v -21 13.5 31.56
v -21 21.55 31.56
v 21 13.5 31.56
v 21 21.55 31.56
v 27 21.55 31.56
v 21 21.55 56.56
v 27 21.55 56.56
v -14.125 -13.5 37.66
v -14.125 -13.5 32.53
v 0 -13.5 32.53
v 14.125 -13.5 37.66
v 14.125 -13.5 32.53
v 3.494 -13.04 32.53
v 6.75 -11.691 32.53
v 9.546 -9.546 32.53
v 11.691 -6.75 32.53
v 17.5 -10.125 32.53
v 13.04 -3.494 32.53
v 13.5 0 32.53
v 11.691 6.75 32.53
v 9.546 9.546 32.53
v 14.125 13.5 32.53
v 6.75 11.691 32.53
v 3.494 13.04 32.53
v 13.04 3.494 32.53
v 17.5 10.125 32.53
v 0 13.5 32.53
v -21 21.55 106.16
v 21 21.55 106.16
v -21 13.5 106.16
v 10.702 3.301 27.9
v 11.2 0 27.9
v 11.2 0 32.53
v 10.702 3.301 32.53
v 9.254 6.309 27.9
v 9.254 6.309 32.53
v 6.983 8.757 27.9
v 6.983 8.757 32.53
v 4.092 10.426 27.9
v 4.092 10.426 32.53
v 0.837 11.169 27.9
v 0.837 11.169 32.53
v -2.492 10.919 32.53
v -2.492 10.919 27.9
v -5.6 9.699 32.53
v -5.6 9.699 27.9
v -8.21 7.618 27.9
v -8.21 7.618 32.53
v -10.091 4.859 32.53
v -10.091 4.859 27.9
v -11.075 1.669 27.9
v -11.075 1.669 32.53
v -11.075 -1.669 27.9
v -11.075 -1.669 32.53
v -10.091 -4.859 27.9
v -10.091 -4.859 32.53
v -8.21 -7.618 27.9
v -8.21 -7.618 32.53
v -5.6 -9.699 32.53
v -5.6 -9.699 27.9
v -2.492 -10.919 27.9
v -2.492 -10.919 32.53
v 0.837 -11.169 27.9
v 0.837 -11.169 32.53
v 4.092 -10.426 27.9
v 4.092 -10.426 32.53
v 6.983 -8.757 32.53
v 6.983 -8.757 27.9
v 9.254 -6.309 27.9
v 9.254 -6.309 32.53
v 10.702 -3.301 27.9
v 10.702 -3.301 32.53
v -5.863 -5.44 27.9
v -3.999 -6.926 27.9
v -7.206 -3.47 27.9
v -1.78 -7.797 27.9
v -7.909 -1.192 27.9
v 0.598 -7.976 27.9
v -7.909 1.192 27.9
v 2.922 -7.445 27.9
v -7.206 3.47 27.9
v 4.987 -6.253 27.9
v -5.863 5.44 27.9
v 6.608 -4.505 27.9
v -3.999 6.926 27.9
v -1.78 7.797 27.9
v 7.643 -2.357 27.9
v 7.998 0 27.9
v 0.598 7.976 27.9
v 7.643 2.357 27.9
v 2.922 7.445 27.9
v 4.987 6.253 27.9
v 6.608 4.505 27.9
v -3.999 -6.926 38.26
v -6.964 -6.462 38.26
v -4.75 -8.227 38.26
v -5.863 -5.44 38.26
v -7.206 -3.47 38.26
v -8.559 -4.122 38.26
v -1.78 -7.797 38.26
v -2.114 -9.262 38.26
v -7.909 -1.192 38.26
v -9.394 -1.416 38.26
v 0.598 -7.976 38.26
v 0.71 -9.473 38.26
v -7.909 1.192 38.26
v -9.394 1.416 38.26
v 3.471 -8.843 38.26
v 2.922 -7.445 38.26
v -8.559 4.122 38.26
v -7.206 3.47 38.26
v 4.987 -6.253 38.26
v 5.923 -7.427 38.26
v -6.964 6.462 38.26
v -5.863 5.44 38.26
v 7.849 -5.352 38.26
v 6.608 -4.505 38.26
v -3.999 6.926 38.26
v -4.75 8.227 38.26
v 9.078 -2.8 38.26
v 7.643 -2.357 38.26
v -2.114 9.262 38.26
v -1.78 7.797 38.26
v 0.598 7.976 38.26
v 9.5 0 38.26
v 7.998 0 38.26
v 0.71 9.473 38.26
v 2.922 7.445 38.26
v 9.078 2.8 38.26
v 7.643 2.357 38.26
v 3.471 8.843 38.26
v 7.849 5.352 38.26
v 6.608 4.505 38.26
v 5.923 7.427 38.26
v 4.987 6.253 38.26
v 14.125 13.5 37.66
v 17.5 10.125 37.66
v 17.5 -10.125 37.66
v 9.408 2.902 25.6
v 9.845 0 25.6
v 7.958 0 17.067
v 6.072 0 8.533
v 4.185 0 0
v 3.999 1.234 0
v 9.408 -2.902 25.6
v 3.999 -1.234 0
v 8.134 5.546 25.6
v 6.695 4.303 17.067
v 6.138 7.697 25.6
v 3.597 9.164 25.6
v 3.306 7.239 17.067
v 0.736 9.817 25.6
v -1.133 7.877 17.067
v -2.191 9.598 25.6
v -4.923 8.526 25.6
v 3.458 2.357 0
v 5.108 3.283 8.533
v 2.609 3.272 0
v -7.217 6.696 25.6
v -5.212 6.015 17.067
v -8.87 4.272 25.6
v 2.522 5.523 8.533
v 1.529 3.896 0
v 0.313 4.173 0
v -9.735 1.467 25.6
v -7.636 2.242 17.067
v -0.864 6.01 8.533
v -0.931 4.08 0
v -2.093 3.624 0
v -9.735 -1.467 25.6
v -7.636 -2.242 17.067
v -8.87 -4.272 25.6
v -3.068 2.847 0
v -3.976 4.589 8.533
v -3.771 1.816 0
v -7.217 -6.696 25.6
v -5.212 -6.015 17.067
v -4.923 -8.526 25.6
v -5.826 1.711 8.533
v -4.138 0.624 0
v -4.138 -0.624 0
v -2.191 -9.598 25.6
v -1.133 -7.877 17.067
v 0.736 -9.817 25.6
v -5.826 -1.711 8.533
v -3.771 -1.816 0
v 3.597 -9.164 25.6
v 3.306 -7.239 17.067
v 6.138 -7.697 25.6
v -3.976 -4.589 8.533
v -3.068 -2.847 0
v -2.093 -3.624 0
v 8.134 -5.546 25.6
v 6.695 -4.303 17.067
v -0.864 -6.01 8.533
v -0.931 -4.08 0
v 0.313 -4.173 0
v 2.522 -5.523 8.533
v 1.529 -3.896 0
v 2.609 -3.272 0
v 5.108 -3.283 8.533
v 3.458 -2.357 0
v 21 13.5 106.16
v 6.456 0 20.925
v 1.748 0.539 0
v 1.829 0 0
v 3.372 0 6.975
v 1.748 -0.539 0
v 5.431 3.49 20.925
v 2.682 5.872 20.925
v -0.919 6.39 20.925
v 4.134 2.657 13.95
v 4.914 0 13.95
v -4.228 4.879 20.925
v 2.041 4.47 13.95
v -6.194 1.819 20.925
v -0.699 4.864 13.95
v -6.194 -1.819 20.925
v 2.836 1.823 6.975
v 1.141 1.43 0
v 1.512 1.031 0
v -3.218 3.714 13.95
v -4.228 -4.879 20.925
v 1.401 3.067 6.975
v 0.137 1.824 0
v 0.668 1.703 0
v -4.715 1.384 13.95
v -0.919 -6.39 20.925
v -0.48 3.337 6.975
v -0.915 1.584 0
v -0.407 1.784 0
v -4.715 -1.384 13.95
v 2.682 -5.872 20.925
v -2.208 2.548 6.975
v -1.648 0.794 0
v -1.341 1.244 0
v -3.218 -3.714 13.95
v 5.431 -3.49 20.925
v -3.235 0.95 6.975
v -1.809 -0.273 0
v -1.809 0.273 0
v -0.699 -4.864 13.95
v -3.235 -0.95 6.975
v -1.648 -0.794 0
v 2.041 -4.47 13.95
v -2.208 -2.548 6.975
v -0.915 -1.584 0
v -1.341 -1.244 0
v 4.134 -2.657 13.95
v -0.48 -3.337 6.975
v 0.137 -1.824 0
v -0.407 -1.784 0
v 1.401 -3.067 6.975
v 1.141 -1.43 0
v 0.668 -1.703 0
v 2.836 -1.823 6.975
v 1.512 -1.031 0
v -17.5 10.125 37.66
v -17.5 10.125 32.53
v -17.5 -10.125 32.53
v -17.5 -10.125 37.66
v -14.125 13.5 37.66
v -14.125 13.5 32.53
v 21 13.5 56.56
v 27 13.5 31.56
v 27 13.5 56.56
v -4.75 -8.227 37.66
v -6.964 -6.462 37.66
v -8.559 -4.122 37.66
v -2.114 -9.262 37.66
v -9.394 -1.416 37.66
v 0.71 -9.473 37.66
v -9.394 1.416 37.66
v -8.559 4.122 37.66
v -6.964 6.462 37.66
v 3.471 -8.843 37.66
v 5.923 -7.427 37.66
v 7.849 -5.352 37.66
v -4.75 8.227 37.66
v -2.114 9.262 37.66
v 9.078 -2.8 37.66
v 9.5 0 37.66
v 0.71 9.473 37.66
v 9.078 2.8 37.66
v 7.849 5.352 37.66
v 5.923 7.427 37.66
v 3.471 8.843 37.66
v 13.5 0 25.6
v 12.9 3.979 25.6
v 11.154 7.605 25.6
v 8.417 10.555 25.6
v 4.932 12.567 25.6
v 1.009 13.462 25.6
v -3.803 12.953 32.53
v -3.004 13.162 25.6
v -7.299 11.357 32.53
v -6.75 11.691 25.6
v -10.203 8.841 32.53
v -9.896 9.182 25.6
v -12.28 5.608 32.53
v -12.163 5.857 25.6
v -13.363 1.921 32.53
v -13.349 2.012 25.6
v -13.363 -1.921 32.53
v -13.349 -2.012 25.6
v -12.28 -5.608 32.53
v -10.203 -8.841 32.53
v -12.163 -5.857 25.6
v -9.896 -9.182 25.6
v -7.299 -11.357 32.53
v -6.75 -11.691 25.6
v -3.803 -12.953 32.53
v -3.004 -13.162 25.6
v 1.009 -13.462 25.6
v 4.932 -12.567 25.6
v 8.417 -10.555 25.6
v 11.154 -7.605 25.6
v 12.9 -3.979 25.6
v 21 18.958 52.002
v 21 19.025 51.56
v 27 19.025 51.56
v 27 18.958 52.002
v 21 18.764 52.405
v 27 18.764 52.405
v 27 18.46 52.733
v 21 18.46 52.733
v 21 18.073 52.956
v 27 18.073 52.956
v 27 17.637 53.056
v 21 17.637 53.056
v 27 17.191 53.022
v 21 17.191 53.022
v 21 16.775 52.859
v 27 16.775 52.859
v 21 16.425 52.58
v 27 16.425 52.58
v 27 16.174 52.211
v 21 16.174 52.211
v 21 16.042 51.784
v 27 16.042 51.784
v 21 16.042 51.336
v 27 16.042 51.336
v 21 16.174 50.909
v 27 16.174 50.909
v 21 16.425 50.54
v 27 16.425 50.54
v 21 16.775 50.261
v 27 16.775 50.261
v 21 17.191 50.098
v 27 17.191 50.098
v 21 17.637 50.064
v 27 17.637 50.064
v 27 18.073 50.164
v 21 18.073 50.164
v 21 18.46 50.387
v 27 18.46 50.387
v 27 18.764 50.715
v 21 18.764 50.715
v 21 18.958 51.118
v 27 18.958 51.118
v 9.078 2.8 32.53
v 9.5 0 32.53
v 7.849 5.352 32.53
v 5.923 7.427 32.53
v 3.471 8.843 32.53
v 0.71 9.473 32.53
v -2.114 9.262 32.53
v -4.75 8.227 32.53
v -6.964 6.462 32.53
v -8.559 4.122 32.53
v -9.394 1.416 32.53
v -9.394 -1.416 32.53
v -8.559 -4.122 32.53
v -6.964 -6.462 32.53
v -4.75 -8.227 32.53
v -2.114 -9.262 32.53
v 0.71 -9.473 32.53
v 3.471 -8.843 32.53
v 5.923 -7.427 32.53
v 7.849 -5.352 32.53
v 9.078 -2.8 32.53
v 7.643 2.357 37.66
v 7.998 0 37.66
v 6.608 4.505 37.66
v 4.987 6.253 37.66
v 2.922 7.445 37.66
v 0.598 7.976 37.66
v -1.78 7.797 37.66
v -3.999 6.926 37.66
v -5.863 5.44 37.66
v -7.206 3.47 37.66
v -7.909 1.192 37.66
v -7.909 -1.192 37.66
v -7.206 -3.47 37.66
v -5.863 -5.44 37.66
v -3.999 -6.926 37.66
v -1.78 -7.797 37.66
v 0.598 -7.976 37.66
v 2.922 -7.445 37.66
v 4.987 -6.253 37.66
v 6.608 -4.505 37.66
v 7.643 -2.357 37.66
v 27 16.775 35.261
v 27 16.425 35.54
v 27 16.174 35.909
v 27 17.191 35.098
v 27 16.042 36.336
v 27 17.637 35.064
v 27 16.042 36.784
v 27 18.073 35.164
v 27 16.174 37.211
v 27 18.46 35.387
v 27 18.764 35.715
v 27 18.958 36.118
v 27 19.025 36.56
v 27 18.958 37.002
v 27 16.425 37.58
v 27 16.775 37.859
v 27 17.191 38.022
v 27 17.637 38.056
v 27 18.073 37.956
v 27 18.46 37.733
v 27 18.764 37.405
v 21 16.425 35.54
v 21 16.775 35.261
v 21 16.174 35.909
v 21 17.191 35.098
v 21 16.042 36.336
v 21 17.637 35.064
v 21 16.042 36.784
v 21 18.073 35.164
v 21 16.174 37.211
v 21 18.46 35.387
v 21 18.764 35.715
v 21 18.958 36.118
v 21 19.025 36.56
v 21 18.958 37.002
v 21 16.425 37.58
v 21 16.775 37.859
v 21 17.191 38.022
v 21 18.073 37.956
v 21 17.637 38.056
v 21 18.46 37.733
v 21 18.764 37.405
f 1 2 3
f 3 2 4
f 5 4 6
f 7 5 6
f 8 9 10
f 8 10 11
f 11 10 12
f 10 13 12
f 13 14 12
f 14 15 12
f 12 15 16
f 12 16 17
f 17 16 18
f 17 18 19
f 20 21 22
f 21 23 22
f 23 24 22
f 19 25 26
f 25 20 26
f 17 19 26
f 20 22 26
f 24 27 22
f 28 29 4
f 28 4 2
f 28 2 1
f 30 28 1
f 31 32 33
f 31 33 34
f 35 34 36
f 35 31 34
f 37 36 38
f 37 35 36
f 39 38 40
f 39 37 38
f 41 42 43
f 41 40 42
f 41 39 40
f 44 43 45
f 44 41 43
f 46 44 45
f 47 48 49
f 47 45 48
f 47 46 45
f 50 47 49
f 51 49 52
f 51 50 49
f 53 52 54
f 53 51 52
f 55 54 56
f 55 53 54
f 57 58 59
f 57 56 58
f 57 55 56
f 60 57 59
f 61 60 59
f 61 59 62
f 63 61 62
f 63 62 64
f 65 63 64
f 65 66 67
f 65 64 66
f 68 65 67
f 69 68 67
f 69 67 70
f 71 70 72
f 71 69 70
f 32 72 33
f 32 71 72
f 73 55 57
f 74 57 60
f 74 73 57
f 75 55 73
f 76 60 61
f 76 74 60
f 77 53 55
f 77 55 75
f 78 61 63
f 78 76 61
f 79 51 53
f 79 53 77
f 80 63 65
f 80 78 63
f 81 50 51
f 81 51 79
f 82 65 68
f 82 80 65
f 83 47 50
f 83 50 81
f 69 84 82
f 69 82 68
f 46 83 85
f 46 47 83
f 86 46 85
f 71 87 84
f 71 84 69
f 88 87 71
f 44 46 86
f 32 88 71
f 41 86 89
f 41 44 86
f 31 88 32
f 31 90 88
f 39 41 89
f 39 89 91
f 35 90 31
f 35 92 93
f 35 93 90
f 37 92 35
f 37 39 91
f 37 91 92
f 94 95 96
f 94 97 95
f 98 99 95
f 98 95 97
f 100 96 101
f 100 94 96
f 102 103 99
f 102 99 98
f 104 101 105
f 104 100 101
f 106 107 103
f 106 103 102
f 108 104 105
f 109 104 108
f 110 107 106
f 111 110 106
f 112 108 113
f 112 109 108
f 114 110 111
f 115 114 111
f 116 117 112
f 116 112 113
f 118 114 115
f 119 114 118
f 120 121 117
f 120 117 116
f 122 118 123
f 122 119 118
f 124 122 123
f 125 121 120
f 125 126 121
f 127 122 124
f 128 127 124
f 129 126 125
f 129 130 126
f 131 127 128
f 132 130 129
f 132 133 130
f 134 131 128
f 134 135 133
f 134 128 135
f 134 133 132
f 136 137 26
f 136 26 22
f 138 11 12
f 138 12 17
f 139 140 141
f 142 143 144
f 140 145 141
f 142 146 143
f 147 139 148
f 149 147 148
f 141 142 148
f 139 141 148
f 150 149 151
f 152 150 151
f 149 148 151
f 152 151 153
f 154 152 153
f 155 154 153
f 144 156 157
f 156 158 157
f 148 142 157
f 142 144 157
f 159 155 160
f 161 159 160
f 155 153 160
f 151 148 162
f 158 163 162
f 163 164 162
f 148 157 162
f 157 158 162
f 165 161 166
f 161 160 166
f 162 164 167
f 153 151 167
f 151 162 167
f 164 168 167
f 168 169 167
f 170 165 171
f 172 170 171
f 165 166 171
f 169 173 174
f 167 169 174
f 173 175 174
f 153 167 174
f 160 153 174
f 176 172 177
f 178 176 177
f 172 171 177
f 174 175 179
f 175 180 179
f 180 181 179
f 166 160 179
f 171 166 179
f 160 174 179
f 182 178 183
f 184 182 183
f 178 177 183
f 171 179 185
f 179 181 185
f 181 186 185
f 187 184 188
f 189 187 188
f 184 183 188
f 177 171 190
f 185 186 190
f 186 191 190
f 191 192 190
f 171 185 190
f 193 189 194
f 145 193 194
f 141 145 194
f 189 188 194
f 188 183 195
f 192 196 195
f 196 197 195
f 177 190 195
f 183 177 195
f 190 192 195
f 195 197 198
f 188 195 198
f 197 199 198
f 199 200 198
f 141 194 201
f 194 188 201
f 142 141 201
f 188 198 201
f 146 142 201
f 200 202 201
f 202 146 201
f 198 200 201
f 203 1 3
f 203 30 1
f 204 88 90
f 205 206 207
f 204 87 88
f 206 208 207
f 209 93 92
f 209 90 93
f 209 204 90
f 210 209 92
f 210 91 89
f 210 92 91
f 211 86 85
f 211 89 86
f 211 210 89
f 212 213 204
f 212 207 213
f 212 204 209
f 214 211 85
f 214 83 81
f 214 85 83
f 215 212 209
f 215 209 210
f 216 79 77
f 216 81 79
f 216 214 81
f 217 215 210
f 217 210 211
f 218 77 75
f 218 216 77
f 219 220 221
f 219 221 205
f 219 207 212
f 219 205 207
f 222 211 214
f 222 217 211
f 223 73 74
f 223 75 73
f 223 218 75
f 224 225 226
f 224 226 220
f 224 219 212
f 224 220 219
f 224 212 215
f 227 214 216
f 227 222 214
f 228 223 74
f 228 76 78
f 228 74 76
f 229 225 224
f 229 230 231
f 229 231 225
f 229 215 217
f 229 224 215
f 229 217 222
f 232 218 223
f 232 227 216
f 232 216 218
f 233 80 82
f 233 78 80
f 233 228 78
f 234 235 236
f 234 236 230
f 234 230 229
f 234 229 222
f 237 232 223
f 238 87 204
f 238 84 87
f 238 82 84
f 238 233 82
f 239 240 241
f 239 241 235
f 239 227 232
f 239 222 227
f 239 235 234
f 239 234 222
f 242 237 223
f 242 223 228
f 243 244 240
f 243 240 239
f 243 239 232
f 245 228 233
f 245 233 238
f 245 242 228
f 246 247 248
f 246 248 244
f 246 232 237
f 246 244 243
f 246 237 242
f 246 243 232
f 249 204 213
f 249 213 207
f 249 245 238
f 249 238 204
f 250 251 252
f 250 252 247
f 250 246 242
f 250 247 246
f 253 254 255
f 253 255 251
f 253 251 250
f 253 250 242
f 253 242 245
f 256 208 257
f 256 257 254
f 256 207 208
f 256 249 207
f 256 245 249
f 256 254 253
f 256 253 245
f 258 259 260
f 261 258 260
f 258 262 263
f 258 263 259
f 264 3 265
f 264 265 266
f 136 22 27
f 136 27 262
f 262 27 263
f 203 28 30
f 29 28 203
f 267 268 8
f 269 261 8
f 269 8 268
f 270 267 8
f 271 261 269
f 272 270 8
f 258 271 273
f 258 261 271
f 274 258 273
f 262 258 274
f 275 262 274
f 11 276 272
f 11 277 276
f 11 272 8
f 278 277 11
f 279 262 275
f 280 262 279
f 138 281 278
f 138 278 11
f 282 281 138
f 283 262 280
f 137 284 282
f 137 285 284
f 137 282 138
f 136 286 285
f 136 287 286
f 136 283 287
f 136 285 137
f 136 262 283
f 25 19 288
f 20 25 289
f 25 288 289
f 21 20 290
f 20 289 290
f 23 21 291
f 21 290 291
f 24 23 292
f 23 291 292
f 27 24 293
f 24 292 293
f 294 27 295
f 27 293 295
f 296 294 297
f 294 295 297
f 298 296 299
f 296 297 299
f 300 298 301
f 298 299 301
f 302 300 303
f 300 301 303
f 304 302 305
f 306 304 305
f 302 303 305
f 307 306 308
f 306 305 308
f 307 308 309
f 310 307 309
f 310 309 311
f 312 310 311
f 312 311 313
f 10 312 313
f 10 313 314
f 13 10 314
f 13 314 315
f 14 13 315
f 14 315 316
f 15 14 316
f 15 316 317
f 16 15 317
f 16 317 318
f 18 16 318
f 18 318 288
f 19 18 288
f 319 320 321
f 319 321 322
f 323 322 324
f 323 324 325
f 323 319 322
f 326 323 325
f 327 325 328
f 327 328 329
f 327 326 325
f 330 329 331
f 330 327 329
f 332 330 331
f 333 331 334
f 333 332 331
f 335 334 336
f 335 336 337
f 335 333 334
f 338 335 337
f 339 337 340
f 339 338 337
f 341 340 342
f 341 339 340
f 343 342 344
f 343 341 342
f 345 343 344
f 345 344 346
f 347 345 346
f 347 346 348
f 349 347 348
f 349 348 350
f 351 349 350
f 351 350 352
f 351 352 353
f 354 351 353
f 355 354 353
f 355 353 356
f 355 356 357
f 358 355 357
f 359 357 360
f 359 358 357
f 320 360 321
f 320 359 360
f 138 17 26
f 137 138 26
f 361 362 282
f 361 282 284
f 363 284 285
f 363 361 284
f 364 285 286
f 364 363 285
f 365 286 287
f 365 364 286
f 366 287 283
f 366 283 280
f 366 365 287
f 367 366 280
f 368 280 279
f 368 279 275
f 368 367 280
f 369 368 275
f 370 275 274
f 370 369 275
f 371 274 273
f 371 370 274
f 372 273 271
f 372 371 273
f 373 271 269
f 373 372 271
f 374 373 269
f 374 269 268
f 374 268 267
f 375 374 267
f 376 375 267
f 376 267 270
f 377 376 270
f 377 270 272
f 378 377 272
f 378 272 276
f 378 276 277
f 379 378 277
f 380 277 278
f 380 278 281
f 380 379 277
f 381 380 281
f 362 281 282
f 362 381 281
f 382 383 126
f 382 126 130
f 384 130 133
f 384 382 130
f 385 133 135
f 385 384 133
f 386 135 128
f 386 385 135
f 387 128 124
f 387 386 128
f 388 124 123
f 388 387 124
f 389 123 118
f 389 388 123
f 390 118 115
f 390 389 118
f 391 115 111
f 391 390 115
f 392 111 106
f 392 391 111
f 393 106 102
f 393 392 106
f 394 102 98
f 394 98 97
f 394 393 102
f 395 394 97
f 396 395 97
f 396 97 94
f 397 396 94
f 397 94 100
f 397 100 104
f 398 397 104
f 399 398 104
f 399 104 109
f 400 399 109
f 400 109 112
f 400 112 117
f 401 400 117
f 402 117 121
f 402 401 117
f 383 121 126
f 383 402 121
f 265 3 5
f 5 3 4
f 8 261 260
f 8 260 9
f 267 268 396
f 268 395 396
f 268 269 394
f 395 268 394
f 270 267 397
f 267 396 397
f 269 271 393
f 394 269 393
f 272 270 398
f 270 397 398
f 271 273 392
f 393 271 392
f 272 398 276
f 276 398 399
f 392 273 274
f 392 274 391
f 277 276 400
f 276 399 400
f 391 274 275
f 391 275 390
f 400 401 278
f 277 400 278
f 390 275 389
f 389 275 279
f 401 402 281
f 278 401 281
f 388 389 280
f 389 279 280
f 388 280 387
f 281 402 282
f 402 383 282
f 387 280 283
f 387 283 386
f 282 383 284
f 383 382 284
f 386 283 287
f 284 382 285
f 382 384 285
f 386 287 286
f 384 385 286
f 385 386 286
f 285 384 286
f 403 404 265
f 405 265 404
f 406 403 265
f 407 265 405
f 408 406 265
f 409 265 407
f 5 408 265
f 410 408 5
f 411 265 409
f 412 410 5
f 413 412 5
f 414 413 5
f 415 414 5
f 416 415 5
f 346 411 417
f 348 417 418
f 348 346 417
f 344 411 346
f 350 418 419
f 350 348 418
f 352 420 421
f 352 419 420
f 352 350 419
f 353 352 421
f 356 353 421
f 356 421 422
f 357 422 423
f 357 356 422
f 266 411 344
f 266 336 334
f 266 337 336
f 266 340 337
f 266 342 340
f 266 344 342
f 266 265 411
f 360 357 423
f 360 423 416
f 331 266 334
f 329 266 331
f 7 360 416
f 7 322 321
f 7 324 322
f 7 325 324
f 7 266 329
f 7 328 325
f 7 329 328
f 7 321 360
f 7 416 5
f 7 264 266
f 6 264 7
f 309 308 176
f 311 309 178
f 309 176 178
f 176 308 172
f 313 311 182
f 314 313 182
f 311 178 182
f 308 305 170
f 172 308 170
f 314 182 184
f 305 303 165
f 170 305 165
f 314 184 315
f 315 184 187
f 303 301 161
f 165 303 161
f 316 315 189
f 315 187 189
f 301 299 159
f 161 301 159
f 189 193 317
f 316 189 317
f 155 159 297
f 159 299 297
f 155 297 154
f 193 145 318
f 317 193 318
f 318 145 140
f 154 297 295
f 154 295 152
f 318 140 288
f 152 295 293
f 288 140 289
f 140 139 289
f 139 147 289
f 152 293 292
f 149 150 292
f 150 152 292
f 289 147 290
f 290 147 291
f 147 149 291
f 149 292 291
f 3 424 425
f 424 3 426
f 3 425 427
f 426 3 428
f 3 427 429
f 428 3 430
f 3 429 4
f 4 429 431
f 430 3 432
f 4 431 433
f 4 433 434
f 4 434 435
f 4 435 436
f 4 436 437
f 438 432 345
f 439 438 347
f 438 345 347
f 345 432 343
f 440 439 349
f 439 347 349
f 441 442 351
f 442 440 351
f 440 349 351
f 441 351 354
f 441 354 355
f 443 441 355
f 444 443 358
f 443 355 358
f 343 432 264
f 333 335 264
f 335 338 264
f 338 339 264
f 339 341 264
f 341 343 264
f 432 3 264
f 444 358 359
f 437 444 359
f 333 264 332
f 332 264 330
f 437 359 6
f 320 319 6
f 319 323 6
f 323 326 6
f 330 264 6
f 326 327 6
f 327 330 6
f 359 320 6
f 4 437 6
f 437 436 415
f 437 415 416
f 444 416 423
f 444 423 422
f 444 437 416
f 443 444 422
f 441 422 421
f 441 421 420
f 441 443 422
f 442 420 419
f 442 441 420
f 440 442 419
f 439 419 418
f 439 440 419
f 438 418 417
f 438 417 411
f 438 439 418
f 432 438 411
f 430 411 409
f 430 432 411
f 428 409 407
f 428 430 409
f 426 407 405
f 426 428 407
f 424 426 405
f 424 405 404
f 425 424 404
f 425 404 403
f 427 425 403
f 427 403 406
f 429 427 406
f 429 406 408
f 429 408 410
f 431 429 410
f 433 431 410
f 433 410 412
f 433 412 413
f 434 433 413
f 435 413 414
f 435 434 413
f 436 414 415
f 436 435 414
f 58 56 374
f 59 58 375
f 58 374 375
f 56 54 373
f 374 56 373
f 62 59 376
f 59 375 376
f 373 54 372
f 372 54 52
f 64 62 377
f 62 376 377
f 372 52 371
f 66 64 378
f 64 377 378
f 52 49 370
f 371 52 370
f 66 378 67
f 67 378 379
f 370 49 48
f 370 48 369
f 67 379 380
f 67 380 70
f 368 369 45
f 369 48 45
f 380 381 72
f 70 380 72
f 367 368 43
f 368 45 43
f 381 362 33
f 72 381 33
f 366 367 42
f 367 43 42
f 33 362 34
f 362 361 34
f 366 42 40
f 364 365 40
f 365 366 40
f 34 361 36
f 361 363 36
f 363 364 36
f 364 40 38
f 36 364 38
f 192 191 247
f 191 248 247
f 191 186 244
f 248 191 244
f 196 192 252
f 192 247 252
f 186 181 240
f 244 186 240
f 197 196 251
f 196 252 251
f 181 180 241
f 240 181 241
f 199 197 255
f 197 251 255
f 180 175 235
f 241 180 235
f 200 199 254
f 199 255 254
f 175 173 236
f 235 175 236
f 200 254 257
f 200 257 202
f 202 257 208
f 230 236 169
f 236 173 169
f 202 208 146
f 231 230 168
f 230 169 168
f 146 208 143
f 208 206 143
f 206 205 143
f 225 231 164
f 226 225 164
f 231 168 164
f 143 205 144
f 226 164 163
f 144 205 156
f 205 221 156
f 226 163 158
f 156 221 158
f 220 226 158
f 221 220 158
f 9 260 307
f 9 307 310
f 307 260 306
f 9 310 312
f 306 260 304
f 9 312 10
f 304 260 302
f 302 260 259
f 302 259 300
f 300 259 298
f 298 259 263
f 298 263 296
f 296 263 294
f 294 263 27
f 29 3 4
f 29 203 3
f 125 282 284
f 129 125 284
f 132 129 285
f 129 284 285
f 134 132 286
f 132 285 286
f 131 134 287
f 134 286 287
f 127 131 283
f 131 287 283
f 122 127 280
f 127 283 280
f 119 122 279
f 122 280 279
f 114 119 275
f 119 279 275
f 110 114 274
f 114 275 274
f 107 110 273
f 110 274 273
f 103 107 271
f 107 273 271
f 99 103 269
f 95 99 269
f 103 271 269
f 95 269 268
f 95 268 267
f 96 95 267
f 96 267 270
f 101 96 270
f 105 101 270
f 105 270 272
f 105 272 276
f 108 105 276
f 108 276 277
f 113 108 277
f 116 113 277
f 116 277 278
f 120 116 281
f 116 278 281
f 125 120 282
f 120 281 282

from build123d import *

# Parameters (mm, degrees)
F2_R           = 9.845
F0_R           = 4.185
F2_R_2         = 13.5
F4_DEPTH       = 6.93
F5_T           = -2.3
F6_R           = 11.2
F6_R_2         = 10.7
F6_R_3         = 9.5
F7_DEPTH       = 5.13
F8_R           = 9.5
F8_R_2         = 7.9979714966
F9_DEPTH       = 0.6
F11_DEPTH      = 68.5
F11_DEPTH_BACK = 6.1
F12_W          = 8.05
F12_H          = 25
F12_R          = 1.5
F13_DEPTH      = 6


with BuildPart() as f3:
    # F2 (on offset) → F3 section 0
    with BuildSketch(Plane.XY.offset(25.6)):
        Circle(F2_R)
    # F0 (on Top) → F3 section 1
    with BuildSketch(Plane.XY):
        Circle(F0_R)
    loft()

    # F2 (on offset) → F4 (join)
    with BuildSketch(Plane.XY.offset(25.6)):
        Circle(F2_R_2)
        Circle(F2_R, mode=Mode.SUBTRACT)
        Circle(F2_R)
    extrude(amount=F4_DEPTH)

    # F5
    f5_openings = [f3.faces().sort_by_distance(p)[0] for p in [
        (0, 0, 32.53),
        (0, 0, 0),
    ]]
    offset(amount=F5_T, openings=f5_openings, kind=Kind.INTERSECTION)

    # F6 (on face) → F7 (join)
    with BuildSketch(Plane.XY.offset(32.53)):
        with BuildLine():
            Line((-14.125, -13.5), (0, -13.5))
            ThreePointArc((0, -13.5), (-13.5, 7.8e-09), (1.55e-08, 13.5))
            Line((1.55e-08, 13.5), (-14.125, 13.5))
            Line((-14.125, 13.5), (-17.5, 10.125))
            Line((-17.5, 10.125), (-17.5, -10.125))
            Line((-17.5, -10.125), (-14.125, -13.5))
        make_face()
        with BuildLine():
            Line((0, -13.5), (14.125, -13.5))
            Line((14.125, -13.5), (17.5, -10.125))
            Line((17.5, -10.125), (17.5, 10.125))
            Line((17.5, 10.125), (14.125, 13.5))
            Line((14.125, 13.5), (1.55e-08, 13.5))
            ThreePointArc((1.55e-08, 13.5), (9.5459415515, 9.5459415405), (13.5, 0))
            ThreePointArc((13.5, 0), (9.545941546, -9.545941546), (0, -13.5))
        make_face()
        with BuildLine():
            ThreePointArc((1.55e-08, 13.5), (-13.5, 7.8e-09), (0, -13.5))
            ThreePointArc((0, -13.5), (9.545941546, -9.545941546), (13.5, 0))
            ThreePointArc((13.5, 0), (9.5459415515, 9.5459415405), (1.55e-08, 13.5))
        make_face()
        Circle(F6_R, mode=Mode.SUBTRACT)
        Circle(F6_R)
        Circle(F6_R_2, mode=Mode.SUBTRACT)
        Circle(F6_R_2)
        Circle(F6_R_3, mode=Mode.SUBTRACT)
    extrude(amount=F7_DEPTH)


with BuildPart() as f9:
    # F8 (on face) → F9 (new body)
    with BuildSketch(Plane.XY.offset(37.66)):
        Circle(F8_R)
        Circle(F8_R_2, mode=Mode.SUBTRACT)
    extrude(amount=F9_DEPTH)


with BuildPart() as f11:
    # F10 (on face) → F11 (new body, two sides)
    with BuildSketch(Plane.XY.offset(37.66)) as f11_sk:
        Polygon((14.125, 13.5), (21, 13.5), (21, 21.55), (-21, 21.55), (-21, 13.5), (-14.125, 13.5), align=None)
    extrude(amount=F11_DEPTH)
    extrude(f11_sk.sketch, amount=-F11_DEPTH_BACK)


with BuildPart() as f13:
    # F12 (on face) → F13 (new body)
    with BuildSketch(Plane.YZ.offset(21)):
        with Locations((17.525, 44.06)):
            Rectangle(F12_W, F12_H)
        with Locations((17.525, 36.56)):
            Circle(F12_R, mode=Mode.SUBTRACT)
        with Locations((17.525, 51.56)):
            Circle(F12_R, mode=Mode.SUBTRACT)
    extrude(amount=F13_DEPTH)


solid = Compound([f3.part, f9.part, f11.part, f13.part])
